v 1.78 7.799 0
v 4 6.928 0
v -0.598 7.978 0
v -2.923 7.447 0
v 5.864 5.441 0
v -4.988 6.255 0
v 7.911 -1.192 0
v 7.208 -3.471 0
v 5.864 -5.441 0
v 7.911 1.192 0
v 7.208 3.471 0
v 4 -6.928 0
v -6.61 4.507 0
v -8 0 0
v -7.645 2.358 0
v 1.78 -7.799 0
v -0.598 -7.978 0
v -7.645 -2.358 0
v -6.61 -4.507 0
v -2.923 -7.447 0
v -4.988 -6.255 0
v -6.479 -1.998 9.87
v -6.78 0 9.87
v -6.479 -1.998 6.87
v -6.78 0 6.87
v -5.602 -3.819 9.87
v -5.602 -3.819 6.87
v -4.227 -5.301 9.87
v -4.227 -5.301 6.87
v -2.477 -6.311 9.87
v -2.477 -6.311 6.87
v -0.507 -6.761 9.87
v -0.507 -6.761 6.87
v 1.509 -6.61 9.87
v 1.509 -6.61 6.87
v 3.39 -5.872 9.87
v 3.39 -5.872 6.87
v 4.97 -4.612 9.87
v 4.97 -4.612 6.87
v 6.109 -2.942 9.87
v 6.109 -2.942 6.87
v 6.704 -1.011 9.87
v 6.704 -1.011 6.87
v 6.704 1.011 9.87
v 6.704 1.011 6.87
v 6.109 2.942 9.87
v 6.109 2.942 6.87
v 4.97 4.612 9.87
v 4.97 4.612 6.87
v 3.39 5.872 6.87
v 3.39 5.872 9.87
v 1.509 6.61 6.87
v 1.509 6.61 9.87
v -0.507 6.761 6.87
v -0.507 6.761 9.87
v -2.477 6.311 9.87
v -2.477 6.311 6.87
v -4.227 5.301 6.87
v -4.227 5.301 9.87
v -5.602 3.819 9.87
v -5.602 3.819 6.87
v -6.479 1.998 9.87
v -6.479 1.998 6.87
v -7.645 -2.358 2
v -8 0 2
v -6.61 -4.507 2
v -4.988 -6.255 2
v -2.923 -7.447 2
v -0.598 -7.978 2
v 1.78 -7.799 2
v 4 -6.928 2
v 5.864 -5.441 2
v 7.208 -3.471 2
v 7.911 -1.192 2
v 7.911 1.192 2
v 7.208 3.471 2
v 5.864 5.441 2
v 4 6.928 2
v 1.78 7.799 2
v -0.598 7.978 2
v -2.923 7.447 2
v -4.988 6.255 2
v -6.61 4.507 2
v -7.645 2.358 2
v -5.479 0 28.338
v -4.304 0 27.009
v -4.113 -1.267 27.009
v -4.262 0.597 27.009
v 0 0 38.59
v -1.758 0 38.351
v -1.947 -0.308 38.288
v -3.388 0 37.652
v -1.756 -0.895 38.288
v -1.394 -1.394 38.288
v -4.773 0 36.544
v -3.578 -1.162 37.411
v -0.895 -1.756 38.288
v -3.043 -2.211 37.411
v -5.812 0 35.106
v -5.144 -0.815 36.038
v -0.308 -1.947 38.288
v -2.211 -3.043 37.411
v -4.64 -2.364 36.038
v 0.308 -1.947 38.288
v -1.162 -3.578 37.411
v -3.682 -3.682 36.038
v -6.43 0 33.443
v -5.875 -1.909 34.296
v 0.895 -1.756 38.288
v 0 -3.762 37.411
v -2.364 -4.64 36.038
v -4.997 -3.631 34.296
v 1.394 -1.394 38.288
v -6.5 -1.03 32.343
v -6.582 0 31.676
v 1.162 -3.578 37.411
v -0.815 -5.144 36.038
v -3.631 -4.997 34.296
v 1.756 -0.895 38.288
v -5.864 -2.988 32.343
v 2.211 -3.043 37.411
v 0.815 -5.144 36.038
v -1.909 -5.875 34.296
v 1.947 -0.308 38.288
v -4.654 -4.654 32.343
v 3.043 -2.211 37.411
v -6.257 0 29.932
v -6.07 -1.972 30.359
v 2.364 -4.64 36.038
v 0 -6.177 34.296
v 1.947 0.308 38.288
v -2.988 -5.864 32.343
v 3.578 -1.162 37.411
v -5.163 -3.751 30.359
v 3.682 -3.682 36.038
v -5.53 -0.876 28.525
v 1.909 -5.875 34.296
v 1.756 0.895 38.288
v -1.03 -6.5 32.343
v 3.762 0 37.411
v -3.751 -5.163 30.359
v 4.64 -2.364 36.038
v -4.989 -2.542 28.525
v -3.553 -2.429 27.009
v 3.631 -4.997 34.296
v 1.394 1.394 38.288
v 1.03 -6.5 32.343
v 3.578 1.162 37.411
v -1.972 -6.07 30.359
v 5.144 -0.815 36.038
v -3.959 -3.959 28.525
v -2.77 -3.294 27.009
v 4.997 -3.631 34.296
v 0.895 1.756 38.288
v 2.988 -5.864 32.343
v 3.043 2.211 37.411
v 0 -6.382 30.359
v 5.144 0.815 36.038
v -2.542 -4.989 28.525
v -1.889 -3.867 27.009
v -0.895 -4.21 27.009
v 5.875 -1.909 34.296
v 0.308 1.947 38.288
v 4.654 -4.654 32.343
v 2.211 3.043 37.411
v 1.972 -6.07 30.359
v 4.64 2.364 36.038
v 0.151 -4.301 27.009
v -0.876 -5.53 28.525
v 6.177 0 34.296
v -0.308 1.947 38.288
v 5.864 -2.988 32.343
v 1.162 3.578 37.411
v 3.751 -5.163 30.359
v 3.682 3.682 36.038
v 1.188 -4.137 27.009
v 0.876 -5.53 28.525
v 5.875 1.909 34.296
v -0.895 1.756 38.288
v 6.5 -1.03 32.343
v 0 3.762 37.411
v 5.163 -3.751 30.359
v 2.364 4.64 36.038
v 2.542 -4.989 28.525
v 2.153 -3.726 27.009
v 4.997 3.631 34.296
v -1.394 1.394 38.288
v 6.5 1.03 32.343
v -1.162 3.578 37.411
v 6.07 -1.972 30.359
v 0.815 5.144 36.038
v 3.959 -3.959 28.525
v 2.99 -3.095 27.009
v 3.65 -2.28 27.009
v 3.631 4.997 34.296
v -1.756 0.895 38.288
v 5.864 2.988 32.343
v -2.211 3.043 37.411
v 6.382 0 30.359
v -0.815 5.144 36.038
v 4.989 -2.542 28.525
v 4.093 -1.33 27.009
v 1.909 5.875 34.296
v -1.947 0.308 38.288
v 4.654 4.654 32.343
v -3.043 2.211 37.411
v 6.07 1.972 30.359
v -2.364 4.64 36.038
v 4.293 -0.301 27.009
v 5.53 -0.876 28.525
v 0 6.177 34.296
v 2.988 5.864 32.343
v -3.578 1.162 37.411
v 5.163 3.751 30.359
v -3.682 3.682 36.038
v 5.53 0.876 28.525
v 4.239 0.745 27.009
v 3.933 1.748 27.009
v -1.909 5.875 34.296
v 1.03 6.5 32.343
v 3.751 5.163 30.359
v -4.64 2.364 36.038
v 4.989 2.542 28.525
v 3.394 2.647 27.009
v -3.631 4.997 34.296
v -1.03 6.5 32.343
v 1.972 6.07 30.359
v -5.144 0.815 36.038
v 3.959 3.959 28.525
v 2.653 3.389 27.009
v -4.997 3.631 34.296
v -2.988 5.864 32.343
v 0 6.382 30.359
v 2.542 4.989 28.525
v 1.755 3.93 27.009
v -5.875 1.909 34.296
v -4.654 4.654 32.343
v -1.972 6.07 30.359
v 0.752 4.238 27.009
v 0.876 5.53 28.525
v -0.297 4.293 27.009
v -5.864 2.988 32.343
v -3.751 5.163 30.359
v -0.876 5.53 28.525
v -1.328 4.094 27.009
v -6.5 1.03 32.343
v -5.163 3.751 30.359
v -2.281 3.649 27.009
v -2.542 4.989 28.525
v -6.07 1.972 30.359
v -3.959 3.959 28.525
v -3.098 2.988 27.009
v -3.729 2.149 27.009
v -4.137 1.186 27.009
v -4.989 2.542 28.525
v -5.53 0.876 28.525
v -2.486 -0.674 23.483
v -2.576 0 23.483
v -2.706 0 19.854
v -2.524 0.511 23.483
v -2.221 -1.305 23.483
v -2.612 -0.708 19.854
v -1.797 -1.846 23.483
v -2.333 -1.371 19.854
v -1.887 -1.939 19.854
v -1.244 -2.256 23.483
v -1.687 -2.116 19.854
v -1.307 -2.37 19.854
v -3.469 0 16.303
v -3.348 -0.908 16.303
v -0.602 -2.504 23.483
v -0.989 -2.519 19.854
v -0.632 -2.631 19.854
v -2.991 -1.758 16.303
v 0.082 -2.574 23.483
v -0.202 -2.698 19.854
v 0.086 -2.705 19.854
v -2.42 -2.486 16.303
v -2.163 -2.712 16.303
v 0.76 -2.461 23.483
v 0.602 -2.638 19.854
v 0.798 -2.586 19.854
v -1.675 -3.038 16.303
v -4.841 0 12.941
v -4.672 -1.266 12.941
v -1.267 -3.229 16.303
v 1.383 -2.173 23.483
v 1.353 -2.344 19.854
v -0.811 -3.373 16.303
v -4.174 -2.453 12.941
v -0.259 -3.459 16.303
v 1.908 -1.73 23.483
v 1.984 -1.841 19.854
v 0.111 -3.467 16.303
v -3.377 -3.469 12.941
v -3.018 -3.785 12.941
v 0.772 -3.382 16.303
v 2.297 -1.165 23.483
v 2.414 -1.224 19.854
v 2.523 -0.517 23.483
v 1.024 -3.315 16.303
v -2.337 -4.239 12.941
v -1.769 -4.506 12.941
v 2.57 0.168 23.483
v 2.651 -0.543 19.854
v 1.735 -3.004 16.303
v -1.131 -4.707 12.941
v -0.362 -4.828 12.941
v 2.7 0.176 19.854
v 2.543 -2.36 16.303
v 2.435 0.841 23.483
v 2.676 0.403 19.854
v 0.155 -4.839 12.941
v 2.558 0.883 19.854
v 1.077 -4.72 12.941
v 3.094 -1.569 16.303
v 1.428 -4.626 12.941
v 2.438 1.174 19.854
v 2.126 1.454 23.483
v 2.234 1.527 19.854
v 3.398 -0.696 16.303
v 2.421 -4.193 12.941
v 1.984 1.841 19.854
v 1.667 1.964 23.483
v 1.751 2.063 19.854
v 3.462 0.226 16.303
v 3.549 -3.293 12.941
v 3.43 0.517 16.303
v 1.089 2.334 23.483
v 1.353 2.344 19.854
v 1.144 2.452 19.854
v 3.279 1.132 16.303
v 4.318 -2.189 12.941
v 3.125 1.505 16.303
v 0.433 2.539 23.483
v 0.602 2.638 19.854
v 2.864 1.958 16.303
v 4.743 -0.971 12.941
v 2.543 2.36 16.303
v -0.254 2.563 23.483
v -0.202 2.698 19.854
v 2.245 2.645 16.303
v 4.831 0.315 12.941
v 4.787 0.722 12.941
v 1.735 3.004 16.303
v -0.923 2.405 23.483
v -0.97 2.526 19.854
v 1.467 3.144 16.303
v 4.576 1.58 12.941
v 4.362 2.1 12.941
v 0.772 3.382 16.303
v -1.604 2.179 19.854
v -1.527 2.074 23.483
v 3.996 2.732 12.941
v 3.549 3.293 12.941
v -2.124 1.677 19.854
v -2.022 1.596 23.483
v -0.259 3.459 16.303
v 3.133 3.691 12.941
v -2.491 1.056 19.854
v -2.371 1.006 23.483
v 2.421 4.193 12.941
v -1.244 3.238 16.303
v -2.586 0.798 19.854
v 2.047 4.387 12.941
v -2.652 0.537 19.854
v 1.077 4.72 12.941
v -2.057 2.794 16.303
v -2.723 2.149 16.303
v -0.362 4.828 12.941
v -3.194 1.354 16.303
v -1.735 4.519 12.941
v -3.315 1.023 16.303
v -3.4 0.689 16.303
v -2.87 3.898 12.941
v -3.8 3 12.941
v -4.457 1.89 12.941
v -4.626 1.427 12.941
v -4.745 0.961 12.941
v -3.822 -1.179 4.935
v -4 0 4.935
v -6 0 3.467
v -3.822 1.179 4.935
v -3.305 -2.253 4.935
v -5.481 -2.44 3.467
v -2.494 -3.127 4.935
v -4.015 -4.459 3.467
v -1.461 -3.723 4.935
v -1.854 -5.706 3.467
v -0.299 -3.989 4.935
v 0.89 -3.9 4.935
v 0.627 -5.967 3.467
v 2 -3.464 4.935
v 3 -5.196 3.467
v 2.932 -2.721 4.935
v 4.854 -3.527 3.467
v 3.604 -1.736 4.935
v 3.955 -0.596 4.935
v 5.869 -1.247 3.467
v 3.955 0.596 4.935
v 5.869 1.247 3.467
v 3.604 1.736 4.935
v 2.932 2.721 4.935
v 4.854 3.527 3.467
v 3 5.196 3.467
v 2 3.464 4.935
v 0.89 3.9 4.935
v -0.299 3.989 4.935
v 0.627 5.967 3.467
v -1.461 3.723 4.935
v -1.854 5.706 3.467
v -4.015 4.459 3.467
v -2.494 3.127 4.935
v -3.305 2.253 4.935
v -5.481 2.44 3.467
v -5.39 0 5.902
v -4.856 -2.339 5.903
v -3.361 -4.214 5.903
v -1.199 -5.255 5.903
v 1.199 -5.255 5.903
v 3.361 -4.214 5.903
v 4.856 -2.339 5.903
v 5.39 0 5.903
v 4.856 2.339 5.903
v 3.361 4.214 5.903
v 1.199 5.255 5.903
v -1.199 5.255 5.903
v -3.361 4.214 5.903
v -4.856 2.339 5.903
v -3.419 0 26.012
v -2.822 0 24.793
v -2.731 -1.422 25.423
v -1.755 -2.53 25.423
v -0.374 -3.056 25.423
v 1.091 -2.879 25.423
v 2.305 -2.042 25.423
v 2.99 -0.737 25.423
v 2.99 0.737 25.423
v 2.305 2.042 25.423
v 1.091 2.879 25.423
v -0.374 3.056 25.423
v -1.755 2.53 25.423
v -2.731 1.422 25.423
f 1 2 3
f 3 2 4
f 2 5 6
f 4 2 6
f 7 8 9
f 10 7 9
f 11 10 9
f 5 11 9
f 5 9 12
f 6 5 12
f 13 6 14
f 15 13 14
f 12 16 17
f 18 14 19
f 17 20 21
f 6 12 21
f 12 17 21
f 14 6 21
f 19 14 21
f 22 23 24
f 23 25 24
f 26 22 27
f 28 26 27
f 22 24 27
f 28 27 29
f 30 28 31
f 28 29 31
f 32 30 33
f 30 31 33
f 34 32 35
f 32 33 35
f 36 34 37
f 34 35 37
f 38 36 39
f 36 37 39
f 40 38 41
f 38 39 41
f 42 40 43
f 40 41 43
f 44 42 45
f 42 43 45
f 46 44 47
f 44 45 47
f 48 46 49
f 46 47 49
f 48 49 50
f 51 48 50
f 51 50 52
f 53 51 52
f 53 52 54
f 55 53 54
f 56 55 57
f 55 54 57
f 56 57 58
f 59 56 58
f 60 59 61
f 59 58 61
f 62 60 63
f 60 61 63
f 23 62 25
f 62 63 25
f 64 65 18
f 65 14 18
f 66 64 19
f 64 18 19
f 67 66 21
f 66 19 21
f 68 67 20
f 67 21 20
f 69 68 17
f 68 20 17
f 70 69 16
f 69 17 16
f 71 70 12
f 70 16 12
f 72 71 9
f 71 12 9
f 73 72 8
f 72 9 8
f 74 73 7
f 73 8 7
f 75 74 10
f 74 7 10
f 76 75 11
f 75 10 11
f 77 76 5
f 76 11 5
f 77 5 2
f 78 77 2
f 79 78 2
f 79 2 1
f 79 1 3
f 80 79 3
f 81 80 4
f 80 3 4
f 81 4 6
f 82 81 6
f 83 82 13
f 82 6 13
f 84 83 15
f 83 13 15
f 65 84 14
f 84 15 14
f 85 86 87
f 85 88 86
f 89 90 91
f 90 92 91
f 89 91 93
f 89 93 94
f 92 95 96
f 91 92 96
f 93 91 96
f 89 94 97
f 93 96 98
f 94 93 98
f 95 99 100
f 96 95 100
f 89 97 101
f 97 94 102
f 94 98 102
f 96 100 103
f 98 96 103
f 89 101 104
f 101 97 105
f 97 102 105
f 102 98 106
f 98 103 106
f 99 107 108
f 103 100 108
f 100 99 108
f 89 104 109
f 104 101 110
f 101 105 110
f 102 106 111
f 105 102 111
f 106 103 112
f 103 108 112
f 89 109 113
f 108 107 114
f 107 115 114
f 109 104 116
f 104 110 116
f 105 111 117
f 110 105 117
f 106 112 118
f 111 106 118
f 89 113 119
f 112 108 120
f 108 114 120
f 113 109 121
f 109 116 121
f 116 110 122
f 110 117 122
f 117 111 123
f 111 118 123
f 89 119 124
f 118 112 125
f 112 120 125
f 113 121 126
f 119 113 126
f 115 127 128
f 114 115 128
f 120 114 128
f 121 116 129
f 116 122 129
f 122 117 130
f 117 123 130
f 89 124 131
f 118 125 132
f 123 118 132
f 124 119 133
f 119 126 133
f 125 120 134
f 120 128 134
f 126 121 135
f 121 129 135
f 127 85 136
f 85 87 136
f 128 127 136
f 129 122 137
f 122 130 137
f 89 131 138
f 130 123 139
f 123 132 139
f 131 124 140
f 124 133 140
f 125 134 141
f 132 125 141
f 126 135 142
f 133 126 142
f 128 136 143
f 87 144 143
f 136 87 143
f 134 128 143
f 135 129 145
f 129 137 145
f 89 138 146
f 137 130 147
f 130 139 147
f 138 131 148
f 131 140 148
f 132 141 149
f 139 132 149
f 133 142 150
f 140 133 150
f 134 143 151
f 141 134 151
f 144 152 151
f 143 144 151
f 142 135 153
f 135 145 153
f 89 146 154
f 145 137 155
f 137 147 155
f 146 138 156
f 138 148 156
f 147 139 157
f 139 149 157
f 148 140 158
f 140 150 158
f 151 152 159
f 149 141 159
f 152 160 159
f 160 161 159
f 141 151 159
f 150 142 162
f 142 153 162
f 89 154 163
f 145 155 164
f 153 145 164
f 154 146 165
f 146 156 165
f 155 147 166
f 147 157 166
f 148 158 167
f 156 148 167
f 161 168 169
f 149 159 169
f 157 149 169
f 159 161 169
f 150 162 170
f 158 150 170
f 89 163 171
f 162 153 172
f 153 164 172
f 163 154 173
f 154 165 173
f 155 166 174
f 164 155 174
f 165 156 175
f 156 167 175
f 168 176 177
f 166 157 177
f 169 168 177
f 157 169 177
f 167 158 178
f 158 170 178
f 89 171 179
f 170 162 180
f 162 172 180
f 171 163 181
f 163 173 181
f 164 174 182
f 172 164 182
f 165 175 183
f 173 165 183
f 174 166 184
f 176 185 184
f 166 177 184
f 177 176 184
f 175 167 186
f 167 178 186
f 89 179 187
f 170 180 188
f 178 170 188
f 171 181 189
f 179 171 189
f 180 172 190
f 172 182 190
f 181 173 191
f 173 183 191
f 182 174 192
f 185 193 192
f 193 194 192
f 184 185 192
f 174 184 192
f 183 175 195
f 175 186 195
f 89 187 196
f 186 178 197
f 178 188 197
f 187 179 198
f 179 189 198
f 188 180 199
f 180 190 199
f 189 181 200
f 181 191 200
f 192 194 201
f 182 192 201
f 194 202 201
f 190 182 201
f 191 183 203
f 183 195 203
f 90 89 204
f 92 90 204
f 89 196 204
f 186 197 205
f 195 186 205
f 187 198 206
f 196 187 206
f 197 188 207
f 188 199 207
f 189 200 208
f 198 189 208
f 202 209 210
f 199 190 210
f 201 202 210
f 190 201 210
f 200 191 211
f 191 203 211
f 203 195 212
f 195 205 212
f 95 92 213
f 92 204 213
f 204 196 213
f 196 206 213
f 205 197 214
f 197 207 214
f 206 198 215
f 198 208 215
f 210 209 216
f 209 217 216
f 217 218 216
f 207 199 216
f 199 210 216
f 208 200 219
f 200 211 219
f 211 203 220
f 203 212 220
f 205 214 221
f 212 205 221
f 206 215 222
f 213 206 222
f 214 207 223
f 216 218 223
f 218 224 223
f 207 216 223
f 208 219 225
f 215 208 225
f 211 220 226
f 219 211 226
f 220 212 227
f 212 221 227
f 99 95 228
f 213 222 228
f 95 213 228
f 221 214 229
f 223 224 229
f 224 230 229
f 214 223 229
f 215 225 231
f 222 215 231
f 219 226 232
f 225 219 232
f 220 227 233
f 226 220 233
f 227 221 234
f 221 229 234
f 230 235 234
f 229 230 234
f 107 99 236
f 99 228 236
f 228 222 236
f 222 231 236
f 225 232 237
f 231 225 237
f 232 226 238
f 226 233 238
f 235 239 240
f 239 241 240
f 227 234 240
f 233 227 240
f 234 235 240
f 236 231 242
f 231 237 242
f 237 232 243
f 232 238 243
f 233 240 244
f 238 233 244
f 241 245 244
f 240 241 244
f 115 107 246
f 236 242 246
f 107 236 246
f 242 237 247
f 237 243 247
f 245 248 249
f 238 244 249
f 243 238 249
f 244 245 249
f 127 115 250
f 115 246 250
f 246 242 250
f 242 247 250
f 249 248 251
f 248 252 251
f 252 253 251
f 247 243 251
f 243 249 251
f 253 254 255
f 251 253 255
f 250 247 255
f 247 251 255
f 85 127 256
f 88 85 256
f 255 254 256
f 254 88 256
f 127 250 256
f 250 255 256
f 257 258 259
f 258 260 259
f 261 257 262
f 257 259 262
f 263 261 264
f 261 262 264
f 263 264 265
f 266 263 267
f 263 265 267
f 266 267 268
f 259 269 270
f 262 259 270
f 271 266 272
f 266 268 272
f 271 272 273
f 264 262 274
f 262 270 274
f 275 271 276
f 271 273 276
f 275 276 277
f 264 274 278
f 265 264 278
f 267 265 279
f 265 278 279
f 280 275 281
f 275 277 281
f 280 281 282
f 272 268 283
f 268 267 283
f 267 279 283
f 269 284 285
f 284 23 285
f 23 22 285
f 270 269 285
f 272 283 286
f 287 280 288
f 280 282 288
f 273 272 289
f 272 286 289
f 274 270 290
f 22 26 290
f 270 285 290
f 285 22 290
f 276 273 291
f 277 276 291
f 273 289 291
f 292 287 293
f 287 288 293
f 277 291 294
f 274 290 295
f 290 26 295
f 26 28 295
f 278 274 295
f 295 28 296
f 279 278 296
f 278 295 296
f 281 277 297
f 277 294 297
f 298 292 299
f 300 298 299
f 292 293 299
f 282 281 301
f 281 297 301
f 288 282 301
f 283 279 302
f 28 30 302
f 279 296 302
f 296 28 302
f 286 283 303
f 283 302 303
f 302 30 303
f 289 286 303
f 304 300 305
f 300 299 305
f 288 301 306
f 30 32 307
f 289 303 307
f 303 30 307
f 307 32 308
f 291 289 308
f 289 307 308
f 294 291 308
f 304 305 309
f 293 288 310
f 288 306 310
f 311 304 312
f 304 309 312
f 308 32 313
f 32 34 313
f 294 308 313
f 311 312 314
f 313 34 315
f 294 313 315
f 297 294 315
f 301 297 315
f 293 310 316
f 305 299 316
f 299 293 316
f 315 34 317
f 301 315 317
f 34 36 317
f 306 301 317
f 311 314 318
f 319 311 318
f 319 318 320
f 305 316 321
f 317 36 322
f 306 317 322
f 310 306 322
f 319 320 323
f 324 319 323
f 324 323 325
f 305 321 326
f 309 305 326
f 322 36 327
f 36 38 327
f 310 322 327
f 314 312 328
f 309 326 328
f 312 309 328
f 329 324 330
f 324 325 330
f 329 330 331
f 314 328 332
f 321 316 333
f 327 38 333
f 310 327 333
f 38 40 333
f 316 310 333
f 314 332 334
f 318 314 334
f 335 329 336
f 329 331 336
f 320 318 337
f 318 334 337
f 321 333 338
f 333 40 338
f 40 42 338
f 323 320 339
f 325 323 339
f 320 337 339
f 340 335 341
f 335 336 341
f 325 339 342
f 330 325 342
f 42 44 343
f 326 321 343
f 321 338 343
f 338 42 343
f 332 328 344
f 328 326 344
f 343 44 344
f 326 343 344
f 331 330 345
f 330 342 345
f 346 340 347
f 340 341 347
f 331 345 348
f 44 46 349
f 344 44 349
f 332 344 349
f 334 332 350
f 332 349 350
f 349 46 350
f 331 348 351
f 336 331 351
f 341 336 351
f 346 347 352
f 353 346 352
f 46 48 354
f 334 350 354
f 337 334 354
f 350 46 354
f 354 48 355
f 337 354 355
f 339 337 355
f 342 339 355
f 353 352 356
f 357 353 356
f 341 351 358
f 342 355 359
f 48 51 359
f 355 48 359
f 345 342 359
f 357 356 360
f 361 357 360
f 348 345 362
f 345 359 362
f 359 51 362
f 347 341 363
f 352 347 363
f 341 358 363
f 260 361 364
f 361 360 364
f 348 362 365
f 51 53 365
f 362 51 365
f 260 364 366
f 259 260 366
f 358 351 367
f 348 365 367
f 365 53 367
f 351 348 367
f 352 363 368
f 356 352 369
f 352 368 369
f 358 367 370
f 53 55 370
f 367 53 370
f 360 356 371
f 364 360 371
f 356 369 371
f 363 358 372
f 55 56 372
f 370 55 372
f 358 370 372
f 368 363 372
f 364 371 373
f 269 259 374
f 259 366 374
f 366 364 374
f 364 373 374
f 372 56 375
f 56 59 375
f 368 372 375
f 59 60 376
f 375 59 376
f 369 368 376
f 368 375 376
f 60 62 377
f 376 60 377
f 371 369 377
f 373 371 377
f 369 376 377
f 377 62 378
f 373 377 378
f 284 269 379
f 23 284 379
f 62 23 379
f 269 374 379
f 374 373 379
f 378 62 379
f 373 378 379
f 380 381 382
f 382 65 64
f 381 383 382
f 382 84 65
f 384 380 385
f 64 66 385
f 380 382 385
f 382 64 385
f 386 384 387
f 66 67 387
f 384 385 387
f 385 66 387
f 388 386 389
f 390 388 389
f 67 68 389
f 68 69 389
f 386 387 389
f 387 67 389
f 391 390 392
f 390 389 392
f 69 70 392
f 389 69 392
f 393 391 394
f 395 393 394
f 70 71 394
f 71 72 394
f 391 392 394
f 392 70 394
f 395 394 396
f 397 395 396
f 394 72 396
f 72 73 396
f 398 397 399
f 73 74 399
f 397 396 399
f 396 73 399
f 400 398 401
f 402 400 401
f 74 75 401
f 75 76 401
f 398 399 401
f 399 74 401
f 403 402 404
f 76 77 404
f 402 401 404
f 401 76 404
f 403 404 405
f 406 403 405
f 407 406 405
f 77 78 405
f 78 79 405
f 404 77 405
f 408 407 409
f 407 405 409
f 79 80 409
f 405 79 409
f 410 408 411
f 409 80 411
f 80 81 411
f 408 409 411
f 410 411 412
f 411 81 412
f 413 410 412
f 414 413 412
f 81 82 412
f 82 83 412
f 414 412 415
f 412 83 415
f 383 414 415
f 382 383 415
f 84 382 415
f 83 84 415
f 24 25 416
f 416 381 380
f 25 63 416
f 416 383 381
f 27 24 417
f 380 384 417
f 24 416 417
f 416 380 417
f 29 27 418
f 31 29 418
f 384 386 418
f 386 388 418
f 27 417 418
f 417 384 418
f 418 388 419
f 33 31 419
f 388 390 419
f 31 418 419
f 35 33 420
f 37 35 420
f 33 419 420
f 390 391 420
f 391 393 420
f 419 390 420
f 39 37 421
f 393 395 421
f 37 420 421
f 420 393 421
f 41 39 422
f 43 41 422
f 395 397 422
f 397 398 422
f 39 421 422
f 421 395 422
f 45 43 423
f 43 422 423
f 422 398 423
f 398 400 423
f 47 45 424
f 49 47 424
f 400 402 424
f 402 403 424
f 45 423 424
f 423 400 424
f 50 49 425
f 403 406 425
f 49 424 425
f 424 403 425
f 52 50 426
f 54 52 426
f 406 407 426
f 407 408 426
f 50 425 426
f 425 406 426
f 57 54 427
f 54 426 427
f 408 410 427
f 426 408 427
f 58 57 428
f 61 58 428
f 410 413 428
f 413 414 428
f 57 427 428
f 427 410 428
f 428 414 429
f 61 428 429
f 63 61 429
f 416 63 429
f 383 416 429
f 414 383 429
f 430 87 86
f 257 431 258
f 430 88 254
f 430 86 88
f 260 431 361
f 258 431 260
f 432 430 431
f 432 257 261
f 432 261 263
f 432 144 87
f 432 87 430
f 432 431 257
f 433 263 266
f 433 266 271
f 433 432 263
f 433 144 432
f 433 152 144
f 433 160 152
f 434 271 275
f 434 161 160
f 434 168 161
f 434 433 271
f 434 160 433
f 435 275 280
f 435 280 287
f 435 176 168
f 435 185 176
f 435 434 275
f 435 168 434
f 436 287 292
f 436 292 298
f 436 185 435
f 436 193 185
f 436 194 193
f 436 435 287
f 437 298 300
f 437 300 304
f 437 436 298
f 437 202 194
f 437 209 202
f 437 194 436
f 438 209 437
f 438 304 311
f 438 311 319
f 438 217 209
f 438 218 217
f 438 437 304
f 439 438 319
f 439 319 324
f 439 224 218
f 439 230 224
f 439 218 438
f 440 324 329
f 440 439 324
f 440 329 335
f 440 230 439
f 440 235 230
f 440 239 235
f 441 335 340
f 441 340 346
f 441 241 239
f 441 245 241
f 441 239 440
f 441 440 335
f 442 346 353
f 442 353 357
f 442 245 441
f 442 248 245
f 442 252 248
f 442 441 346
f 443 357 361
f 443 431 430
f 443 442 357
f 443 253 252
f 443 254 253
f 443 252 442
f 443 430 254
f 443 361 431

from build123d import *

# Parameters (mm, degrees)
F2_R = 5


with BuildPart() as f1:
    # F0 (on Front) → F1 (revolve)
    with BuildSketch(Plane.XZ):
        with BuildLine():
            Line((-8, 0), (0, 0))
            Line((0, 0), (0, 9.87))
            Line((0, 9.87), (0, 26.07))
            Line((0, 26.07), (0, 32))
            Line((0, 32), (0, 38.59))
            ThreePointArc((0, 38.59), (-6.422881, 33.474686), (-2.874578, 26.07))
            ThreePointArc((-2.874578, 26.07), (-3.123928, 17.559362), (-6.78, 9.87))
            Line((-6.78, 9.87), (-6.78, 6.87))
            Line((-6.78, 6.87), (-4, 4.935))
            Line((-4, 4.935), (-8, 2))
            Line((-8, 2), (-8, 0))
        make_face()
    revolve(axis=Axis((0, 0, 35.295), (0, 0, 1)))

    # F2
    f2_edges = [f1.edges().sort_by_distance(p)[0] for p in [
        (2.874578, 0, 26.07),
        (-6.422881, 0, 33.474686),
    ]]
    fillet(f2_edges, radius=F2_R)


solid = f1.part
